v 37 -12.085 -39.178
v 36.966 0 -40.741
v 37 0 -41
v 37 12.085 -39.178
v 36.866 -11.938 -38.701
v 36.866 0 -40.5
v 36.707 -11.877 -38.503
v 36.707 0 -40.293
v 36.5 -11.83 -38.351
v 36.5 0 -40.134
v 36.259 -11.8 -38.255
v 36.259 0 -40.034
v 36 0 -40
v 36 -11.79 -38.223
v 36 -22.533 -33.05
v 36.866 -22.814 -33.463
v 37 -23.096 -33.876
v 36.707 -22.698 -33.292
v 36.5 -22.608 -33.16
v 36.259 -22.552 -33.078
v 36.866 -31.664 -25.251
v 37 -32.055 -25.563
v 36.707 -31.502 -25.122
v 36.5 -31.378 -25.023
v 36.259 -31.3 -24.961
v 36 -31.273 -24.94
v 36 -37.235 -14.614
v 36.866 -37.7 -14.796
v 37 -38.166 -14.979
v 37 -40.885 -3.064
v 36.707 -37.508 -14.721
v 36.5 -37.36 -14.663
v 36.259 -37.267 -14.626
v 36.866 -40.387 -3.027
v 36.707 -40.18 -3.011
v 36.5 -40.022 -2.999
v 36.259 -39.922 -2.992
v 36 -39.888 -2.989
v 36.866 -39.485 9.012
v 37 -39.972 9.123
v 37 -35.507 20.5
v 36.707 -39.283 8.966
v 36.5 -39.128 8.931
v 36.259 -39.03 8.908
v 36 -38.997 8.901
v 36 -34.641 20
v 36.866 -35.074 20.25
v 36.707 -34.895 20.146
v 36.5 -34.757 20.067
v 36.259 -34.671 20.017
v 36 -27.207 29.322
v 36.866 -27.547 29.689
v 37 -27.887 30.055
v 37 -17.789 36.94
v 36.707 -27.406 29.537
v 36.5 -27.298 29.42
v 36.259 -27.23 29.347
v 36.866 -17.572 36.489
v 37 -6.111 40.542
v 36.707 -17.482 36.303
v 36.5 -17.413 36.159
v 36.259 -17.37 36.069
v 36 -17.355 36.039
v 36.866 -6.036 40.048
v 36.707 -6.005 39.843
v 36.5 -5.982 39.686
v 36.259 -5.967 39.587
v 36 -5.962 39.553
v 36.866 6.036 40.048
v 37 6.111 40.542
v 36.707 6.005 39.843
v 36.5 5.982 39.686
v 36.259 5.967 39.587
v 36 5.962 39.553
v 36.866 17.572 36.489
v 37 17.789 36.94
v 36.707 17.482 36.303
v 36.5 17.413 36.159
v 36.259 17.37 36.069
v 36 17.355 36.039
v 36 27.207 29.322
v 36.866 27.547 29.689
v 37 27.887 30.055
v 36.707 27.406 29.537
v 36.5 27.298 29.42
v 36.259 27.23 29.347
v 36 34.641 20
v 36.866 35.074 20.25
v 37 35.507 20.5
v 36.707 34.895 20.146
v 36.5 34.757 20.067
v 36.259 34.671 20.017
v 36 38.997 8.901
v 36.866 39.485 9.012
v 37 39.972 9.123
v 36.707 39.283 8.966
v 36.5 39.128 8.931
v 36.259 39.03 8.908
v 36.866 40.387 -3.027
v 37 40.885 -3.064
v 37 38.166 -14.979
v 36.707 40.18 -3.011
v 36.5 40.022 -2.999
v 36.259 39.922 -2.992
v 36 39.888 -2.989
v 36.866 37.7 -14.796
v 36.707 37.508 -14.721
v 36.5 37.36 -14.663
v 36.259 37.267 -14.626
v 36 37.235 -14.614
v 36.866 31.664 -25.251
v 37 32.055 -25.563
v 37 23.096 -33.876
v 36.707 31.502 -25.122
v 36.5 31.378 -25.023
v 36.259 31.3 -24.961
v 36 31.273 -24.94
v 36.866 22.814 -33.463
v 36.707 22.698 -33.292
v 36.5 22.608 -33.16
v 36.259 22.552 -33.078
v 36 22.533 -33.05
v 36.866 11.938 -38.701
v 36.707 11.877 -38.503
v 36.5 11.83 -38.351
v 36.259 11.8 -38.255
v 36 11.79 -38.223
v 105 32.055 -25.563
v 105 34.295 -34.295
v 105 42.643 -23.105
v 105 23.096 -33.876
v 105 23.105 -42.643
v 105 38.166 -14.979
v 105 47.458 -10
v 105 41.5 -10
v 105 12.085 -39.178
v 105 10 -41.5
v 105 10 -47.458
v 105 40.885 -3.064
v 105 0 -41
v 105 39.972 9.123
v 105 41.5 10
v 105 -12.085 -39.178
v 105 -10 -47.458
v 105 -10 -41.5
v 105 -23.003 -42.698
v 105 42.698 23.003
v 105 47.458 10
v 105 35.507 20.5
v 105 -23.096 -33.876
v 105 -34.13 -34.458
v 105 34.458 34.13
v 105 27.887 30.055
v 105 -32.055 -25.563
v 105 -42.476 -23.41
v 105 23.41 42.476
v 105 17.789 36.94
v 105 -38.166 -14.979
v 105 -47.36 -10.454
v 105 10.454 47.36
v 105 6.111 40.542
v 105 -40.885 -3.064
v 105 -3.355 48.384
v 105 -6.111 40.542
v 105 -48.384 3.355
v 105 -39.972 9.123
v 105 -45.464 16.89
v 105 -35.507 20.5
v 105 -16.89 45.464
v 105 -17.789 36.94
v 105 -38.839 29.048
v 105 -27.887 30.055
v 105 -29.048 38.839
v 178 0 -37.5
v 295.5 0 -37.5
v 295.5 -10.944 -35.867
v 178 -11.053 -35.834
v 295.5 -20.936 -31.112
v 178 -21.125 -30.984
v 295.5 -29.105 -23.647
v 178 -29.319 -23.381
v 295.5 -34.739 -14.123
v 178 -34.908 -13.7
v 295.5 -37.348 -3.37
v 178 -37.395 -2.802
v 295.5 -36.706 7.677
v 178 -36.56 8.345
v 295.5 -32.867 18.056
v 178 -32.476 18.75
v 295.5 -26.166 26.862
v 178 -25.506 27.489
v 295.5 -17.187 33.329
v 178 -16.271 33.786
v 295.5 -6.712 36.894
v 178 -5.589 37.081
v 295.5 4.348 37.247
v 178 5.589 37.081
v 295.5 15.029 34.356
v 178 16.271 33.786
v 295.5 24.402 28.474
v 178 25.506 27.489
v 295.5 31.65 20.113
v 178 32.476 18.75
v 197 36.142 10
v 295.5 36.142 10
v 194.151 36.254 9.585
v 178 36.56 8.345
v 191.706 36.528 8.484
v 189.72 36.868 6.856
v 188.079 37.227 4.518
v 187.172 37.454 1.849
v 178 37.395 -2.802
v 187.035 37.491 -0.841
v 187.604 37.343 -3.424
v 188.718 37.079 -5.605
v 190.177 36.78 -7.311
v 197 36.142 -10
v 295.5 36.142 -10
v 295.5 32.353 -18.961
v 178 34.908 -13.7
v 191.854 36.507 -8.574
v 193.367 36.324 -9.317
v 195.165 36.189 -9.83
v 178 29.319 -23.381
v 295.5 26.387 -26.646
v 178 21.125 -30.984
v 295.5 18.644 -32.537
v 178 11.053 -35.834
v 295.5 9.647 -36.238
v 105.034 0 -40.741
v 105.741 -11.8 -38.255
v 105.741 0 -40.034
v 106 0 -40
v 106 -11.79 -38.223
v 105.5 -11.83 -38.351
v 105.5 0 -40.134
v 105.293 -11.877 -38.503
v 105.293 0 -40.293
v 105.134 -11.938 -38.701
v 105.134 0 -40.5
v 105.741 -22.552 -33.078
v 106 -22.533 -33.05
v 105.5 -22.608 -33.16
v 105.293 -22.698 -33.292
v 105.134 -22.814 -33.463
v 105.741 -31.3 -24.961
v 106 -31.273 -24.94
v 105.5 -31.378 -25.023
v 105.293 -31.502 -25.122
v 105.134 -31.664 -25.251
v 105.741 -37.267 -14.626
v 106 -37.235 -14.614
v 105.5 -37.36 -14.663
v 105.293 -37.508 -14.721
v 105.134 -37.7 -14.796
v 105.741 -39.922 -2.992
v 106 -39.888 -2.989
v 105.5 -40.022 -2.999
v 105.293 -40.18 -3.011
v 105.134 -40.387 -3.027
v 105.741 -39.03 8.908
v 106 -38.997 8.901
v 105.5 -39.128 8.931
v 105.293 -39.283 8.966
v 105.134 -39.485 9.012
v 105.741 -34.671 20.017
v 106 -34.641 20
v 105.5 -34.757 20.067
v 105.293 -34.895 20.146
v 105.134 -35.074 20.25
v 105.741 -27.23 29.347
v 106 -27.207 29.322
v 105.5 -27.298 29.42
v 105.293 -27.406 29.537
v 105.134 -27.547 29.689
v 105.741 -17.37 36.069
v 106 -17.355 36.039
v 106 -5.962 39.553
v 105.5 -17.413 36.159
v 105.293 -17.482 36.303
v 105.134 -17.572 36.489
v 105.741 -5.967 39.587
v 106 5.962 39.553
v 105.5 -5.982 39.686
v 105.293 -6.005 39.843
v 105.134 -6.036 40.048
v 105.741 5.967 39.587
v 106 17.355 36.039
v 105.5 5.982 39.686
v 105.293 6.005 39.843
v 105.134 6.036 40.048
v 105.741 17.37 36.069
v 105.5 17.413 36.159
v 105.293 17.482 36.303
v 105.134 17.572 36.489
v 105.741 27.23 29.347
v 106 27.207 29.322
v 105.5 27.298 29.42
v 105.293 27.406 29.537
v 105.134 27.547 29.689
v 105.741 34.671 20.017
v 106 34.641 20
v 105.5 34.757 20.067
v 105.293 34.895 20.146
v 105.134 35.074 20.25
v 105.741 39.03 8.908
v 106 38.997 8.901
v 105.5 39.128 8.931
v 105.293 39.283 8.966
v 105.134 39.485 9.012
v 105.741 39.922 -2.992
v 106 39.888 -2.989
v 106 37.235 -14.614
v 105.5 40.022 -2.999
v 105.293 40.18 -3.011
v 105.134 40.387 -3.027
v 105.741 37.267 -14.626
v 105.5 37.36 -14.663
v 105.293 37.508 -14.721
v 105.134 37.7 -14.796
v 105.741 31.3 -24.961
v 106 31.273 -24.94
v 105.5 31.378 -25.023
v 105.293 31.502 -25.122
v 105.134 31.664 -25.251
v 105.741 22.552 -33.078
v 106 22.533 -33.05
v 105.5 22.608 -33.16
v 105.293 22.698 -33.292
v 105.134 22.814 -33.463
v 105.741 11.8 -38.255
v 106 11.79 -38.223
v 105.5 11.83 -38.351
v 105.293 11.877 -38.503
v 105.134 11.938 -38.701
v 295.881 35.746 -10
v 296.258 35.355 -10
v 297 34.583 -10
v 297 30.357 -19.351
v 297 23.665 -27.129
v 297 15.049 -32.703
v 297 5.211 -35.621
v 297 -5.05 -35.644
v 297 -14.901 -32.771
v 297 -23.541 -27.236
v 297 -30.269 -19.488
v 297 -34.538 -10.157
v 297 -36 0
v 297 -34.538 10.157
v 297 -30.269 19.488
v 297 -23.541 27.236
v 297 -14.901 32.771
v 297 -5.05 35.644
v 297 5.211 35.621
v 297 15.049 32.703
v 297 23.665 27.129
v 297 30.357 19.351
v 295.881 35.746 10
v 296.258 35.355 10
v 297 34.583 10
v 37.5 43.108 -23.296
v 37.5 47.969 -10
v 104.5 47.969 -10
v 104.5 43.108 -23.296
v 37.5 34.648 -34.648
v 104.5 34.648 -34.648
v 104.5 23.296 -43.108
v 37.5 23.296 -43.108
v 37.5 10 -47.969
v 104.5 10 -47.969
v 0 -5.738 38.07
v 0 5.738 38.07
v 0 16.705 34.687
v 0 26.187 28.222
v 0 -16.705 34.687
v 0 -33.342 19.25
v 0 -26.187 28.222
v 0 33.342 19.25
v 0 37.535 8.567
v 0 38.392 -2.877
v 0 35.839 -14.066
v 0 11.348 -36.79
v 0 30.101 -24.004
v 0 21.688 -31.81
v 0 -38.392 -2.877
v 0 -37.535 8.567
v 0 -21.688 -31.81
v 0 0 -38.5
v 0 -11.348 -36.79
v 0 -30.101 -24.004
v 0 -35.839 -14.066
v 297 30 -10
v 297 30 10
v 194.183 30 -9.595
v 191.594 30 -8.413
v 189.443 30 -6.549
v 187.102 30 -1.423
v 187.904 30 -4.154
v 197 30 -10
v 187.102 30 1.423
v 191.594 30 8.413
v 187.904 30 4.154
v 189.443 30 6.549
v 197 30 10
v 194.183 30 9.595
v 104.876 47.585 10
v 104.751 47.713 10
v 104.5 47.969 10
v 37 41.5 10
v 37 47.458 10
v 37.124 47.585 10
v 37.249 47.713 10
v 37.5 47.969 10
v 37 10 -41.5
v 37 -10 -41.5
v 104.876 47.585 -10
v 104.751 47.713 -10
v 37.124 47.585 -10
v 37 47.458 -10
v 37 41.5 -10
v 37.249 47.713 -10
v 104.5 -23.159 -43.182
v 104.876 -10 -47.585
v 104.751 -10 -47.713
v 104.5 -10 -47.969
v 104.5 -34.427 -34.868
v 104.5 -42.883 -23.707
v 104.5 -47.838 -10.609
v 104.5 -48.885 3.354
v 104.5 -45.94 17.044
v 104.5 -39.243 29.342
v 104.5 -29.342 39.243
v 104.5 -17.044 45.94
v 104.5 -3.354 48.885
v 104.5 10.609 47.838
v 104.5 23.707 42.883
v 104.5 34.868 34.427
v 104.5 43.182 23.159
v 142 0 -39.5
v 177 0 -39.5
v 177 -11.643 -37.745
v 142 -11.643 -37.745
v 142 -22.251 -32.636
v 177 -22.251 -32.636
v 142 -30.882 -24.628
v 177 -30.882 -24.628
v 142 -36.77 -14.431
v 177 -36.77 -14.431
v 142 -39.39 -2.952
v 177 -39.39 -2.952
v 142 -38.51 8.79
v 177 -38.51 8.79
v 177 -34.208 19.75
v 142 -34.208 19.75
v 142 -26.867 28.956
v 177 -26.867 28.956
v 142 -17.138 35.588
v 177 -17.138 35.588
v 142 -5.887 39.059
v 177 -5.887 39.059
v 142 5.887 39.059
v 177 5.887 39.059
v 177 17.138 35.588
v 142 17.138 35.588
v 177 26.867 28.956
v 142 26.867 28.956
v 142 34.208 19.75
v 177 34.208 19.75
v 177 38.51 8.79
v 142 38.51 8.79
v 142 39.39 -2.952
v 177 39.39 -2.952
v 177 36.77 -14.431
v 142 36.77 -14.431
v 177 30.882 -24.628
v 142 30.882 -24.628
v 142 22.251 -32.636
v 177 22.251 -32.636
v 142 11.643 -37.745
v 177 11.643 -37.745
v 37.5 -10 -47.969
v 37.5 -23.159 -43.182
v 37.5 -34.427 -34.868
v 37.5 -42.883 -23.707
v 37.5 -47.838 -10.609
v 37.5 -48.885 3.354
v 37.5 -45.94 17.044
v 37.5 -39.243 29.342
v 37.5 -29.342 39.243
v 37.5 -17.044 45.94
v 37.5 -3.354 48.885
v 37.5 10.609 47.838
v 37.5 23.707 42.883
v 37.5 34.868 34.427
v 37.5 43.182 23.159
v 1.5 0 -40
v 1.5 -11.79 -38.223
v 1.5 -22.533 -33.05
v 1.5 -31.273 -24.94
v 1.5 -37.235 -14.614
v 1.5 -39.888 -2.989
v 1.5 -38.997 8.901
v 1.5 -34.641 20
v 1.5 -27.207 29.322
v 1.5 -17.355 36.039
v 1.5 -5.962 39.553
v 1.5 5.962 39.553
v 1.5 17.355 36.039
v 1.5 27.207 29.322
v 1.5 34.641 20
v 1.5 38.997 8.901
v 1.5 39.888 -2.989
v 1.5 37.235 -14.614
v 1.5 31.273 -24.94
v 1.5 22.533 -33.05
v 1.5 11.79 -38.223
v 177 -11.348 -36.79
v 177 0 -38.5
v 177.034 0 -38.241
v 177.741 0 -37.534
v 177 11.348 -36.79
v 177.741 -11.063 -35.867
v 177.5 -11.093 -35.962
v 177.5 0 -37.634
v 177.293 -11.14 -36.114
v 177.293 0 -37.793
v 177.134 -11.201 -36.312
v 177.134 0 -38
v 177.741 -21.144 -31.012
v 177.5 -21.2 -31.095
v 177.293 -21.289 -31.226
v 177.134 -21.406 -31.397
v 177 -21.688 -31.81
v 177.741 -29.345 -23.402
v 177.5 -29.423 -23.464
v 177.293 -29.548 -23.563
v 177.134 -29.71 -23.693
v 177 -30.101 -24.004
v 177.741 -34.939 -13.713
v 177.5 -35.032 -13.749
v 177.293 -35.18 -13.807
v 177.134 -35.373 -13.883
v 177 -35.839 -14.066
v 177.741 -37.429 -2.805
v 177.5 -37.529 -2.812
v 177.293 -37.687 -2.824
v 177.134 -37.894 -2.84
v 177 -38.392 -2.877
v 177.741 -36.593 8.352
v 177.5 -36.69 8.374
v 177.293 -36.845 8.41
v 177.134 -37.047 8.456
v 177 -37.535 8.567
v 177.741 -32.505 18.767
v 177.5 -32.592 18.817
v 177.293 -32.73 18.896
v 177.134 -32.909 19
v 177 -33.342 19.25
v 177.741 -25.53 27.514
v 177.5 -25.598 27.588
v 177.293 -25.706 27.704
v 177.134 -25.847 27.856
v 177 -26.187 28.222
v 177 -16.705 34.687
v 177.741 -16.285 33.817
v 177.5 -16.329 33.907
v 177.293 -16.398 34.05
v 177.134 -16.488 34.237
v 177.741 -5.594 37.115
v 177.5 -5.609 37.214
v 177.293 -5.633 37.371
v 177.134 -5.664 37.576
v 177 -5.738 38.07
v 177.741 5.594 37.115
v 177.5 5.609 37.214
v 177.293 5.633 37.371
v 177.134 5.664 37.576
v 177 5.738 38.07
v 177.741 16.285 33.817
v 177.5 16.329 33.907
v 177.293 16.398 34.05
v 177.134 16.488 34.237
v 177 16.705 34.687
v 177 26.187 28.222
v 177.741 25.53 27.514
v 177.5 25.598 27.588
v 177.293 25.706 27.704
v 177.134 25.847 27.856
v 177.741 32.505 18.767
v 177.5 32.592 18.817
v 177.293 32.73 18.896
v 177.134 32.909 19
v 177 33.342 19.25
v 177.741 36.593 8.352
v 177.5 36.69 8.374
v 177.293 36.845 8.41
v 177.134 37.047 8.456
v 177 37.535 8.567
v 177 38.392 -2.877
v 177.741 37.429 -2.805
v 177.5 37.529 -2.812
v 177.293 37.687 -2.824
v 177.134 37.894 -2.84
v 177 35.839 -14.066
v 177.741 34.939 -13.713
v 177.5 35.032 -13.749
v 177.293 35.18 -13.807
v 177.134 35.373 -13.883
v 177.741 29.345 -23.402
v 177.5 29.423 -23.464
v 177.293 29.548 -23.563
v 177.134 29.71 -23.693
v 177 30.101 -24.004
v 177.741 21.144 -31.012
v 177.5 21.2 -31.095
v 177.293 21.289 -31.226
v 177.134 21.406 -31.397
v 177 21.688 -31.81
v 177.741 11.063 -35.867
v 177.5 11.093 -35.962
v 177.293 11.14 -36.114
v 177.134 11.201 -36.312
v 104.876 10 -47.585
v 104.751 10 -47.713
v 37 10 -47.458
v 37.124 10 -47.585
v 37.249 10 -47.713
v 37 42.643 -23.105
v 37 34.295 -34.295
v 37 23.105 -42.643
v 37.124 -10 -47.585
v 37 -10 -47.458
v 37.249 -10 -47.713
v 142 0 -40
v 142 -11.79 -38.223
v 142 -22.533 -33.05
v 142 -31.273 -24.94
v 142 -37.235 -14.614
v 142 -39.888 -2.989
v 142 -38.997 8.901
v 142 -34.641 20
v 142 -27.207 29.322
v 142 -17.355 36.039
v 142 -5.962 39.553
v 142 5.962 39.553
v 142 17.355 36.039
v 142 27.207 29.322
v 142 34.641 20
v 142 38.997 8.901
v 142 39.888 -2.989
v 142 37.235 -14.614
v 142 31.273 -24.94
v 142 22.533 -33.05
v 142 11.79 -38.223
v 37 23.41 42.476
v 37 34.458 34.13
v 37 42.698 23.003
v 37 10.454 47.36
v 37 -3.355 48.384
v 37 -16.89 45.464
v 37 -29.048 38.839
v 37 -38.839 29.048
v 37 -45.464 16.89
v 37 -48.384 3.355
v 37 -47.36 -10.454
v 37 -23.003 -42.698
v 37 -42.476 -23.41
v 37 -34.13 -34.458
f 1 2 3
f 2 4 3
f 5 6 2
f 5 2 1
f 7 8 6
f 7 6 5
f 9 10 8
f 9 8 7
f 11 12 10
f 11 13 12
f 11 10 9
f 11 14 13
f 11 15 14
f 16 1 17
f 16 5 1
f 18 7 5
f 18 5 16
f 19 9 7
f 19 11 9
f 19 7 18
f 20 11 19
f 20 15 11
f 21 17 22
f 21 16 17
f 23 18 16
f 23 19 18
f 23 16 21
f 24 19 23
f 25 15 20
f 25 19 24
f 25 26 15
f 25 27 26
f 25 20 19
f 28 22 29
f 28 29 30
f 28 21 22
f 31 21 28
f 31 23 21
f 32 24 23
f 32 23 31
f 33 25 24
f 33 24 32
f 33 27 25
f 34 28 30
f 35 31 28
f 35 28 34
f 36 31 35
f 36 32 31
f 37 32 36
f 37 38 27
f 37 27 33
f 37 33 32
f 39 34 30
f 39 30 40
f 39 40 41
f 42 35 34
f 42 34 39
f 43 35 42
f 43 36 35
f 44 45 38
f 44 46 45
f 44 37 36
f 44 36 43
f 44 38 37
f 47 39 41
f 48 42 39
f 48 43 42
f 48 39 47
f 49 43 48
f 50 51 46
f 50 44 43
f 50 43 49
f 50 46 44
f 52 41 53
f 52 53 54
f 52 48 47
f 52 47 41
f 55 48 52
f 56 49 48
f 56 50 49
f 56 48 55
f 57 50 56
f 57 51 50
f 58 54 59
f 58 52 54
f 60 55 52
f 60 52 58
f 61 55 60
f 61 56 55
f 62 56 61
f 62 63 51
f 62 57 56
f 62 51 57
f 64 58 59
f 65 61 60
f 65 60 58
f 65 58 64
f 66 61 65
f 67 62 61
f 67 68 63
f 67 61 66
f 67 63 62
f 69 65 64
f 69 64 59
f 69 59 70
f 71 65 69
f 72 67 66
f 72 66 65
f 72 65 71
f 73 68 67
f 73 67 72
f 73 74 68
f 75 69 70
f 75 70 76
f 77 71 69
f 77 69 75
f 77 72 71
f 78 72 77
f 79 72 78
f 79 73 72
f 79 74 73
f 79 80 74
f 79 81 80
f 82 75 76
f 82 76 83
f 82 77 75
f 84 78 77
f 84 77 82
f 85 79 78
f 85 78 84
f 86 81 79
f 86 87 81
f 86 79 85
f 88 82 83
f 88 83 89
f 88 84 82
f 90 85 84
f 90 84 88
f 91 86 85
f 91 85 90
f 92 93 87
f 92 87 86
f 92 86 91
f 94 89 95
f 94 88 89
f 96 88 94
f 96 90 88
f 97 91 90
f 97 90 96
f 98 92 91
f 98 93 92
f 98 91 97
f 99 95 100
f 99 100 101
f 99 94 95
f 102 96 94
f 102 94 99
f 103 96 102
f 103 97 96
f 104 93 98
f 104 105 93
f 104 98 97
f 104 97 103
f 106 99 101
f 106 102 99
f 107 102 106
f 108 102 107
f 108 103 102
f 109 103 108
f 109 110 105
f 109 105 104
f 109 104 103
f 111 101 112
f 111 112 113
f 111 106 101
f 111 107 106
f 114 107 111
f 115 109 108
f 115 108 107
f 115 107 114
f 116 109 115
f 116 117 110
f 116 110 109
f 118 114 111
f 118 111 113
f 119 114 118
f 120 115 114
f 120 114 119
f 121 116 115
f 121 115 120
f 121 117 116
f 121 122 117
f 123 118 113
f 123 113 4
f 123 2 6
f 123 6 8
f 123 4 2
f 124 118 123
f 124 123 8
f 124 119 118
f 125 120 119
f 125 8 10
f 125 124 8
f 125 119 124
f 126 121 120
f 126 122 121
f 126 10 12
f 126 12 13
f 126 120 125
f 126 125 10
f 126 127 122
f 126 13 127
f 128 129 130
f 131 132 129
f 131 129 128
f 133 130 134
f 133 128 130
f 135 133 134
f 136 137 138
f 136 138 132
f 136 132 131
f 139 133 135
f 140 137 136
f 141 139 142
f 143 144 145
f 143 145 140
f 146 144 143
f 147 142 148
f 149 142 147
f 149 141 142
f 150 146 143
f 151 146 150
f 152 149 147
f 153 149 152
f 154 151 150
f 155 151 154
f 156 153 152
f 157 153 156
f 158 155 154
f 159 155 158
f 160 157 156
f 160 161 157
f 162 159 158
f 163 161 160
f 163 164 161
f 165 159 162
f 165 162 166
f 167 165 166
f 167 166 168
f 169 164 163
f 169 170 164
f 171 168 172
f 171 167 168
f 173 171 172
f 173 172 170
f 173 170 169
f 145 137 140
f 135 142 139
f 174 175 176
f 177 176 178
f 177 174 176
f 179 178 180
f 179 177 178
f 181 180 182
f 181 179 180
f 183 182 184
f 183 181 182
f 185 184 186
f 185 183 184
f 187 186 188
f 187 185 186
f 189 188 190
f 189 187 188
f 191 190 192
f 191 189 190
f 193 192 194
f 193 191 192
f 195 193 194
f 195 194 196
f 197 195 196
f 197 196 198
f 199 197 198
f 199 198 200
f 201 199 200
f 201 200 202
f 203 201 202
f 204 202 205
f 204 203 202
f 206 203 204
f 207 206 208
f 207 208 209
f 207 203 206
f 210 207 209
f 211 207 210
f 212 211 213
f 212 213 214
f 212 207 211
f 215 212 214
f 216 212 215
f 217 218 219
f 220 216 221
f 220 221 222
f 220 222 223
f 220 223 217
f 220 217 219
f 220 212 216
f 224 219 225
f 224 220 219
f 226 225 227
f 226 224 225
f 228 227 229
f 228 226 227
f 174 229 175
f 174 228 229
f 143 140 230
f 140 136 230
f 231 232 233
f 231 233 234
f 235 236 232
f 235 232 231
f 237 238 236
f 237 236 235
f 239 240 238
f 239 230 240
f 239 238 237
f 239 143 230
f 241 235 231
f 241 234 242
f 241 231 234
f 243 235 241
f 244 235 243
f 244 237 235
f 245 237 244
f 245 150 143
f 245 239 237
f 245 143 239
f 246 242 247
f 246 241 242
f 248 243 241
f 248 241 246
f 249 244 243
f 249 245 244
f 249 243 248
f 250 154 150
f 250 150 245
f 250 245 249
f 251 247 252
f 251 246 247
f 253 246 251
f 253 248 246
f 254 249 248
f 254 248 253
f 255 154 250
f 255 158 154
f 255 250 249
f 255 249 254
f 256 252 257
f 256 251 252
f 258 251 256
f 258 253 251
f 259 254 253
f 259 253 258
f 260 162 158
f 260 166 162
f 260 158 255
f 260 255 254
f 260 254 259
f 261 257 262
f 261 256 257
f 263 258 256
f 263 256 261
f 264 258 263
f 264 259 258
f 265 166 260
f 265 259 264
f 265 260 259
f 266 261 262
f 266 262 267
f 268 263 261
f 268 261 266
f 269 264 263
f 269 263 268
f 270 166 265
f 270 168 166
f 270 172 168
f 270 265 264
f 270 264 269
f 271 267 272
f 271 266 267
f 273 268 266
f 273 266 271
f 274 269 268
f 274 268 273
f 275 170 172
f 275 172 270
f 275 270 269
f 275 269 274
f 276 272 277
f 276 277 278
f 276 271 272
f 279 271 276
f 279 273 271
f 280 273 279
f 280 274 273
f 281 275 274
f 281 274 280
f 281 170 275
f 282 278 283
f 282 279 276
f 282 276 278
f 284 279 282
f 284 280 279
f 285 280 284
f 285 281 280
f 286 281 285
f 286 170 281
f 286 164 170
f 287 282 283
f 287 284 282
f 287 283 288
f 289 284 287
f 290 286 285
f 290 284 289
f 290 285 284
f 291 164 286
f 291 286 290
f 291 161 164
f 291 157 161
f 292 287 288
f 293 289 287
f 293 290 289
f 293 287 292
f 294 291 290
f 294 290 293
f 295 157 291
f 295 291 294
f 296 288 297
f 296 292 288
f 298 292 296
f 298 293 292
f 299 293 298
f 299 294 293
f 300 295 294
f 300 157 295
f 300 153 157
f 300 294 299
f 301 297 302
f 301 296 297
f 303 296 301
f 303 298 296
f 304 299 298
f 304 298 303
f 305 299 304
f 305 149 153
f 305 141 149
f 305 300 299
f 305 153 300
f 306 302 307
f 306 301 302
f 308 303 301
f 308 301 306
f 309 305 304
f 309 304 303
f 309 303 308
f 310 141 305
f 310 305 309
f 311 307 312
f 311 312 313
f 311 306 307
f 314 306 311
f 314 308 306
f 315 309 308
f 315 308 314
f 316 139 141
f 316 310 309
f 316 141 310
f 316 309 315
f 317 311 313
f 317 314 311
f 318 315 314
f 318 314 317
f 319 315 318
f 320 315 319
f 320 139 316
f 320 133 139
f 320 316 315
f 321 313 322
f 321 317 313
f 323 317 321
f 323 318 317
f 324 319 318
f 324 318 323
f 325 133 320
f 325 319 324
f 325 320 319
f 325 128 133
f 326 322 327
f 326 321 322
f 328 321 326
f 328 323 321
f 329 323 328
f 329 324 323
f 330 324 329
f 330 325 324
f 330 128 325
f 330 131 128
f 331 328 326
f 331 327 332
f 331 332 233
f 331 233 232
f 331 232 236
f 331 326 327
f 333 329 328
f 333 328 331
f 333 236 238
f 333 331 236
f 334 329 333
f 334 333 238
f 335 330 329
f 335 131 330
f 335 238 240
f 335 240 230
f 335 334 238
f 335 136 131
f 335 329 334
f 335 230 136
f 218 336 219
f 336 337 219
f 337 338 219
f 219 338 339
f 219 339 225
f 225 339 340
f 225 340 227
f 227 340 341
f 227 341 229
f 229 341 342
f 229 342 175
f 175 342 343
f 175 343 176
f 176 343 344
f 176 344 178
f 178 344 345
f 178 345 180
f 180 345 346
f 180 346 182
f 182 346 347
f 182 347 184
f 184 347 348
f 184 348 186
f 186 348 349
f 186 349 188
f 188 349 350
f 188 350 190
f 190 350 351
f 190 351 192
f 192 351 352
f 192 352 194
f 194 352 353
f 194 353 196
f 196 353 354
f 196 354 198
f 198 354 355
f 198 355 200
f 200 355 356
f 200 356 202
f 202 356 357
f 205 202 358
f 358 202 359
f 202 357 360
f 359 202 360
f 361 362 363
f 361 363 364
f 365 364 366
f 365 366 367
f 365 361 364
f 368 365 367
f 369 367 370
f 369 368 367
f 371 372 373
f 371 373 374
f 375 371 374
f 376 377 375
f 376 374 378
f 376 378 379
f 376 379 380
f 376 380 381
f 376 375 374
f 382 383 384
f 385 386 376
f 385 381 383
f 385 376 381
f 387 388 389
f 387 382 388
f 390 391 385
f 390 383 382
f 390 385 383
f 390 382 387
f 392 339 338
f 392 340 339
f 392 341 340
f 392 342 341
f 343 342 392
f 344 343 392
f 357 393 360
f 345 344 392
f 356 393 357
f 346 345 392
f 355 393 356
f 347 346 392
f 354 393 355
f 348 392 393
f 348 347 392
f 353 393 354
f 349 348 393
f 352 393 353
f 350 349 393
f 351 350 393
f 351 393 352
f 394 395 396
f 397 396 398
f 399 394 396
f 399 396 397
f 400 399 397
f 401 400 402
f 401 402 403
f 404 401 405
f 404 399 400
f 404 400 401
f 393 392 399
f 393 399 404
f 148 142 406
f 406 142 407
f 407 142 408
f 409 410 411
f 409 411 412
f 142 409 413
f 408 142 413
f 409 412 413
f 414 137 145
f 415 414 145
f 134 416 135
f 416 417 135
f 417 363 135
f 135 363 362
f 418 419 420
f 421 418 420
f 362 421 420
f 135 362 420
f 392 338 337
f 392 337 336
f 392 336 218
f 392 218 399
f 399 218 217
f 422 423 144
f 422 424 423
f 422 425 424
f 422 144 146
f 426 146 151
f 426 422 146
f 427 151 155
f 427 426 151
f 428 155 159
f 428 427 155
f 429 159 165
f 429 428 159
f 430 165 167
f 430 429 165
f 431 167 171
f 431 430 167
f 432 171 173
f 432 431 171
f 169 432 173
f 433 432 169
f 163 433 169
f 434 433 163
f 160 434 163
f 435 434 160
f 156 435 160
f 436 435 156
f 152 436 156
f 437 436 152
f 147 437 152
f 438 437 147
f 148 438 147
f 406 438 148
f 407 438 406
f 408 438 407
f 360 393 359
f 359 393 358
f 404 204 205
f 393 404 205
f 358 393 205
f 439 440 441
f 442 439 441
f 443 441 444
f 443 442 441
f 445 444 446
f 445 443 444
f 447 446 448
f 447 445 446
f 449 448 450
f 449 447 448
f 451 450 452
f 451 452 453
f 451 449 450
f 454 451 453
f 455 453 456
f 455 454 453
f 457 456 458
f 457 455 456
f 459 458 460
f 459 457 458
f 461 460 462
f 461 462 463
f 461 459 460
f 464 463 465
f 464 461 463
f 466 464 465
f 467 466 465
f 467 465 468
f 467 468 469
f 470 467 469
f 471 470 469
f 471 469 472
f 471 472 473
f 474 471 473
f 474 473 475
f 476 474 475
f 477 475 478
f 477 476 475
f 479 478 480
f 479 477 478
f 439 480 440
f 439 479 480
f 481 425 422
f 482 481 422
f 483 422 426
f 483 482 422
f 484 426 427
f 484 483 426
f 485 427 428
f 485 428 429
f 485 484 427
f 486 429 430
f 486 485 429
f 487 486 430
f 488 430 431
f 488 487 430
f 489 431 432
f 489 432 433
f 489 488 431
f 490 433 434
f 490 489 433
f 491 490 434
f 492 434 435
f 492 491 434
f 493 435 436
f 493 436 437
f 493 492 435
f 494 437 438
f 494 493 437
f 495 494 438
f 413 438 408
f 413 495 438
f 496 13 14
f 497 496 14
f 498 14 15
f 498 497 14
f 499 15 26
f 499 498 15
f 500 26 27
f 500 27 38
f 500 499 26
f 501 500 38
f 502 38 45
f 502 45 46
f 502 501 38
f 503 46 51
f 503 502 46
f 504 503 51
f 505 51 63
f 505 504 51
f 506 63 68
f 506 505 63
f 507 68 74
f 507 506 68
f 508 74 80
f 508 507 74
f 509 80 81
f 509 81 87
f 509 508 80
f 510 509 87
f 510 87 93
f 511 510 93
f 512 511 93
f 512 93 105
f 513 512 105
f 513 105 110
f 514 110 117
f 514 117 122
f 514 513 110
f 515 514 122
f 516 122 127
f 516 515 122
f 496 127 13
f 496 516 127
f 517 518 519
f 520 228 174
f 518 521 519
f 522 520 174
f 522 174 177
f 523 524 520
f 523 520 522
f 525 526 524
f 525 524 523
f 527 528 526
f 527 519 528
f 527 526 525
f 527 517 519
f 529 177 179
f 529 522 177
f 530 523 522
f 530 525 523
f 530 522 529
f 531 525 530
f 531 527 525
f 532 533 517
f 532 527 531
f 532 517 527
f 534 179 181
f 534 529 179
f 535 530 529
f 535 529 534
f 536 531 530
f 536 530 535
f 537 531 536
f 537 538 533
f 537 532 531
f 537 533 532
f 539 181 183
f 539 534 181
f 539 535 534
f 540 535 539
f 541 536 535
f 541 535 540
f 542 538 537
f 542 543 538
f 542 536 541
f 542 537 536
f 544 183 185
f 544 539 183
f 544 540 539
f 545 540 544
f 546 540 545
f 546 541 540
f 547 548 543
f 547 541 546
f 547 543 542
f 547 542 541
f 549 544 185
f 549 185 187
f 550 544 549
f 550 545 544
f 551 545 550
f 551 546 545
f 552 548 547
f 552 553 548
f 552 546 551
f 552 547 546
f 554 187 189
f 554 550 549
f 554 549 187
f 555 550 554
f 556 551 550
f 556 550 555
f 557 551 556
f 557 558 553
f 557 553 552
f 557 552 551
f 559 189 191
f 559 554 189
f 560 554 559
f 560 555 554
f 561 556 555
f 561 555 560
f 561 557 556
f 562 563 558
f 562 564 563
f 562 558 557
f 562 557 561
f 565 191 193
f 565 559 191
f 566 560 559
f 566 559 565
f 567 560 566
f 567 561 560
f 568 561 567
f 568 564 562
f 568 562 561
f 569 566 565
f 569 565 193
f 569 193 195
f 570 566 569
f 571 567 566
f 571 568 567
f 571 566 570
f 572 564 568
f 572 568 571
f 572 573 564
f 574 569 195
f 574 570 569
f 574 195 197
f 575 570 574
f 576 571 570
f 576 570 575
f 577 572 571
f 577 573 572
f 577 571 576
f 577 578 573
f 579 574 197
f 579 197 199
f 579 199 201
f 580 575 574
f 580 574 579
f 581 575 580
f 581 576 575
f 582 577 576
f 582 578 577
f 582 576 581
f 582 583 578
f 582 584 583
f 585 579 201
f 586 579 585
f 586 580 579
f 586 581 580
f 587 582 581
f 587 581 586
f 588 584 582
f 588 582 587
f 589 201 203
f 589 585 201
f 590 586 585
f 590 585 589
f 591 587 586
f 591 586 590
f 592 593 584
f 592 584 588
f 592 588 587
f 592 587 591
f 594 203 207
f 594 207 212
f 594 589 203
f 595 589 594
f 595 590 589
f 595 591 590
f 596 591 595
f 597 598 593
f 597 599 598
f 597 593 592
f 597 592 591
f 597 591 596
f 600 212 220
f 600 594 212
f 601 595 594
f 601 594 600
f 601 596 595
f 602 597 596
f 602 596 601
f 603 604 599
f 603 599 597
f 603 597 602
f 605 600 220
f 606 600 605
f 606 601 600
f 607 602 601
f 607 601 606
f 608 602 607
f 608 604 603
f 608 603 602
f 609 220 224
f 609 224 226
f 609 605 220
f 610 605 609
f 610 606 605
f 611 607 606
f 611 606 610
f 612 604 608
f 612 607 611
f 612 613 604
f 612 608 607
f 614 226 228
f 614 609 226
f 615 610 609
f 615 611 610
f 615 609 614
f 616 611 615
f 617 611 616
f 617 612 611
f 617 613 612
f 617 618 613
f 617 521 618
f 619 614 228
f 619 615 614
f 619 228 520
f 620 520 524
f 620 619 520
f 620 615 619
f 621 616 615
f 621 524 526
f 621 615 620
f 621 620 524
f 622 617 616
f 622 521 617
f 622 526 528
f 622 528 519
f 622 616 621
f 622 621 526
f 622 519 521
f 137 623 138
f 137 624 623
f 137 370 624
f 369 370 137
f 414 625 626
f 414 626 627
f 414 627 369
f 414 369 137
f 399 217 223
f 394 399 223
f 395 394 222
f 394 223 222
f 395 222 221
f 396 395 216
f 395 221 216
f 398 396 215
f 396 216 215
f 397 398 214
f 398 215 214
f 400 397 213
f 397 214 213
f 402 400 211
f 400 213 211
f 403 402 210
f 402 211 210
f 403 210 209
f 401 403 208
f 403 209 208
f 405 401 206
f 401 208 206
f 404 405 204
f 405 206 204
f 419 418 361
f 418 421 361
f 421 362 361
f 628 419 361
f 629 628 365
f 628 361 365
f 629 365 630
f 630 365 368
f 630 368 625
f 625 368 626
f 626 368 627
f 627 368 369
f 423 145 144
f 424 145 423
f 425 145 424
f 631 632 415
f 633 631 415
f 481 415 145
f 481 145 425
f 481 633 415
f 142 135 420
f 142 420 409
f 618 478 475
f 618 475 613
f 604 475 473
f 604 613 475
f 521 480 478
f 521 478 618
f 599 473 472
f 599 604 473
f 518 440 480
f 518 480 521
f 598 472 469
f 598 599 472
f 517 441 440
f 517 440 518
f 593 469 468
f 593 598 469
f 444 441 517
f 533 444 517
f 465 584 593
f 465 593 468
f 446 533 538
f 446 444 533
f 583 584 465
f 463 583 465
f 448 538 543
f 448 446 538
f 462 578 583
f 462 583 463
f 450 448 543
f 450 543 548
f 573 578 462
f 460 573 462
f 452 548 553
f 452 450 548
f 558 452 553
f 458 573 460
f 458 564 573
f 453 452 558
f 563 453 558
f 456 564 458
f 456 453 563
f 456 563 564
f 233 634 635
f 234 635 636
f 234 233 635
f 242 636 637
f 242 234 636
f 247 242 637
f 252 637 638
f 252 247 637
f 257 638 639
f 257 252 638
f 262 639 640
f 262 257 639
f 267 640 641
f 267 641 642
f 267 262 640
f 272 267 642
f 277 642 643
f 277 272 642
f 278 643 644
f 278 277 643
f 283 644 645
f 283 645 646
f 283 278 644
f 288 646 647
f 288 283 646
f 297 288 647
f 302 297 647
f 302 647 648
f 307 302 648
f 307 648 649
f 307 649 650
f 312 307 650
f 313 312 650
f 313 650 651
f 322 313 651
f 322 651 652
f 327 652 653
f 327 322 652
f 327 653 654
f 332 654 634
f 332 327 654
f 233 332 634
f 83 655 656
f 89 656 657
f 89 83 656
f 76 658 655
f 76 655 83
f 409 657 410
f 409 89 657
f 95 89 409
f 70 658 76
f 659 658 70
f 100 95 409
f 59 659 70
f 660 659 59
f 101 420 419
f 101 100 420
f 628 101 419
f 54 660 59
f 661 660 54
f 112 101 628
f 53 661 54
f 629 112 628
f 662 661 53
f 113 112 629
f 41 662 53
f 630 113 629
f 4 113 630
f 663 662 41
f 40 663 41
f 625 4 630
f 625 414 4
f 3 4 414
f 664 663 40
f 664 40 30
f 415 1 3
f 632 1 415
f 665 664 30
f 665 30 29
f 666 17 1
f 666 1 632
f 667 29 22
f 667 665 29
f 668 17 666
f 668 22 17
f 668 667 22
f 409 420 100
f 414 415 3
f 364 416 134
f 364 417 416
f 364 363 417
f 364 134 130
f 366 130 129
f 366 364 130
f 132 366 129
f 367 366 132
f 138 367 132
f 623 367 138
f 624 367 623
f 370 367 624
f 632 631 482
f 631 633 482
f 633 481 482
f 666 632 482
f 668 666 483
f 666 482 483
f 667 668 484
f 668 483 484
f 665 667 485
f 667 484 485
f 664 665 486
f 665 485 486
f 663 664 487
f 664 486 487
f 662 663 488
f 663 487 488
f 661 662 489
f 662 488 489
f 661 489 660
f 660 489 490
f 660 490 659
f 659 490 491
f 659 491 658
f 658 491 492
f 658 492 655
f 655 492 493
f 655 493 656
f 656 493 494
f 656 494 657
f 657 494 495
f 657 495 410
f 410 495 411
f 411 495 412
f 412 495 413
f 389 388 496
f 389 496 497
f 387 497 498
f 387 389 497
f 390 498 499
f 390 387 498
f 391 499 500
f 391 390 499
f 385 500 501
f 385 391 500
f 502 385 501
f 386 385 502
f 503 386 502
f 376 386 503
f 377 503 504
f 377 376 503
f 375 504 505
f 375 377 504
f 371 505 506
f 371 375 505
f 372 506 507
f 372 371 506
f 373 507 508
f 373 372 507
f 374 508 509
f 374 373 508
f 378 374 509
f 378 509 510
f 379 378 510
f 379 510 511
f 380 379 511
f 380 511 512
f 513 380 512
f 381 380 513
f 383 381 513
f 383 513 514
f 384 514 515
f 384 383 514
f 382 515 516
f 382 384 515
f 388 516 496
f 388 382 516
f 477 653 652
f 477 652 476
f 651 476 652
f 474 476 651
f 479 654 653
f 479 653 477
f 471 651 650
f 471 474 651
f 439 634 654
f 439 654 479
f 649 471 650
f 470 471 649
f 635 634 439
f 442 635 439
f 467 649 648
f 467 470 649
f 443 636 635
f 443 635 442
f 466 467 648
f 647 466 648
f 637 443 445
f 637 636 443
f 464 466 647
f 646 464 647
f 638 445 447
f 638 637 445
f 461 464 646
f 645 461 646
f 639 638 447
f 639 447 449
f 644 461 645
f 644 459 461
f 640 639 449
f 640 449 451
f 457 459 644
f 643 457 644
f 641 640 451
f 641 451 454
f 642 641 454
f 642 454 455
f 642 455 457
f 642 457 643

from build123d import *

# Parameters (mm, degrees)
EXTRUDE1_DEPTH = 68
FILLET1_R      = 1
EXTRUDE2_DEPTH = 7.5
CHAMFER1_SIZE  = 1.5
CHAMFER2_SIZE  = 0.5


with BuildPart() as part:
    # Sketch1 → Revolve1 (revolve)
    with BuildSketch(Plane.XY, mode=Mode.PRIVATE) as revolve1_sk:
        Polygon((0, 0), (297, 0), (297, 37.5), (177, 37.5), (177, 39.5), (142, 39.5), (142, 40), (105, 40), (105, 49), (37, 49), (37, 40), (0, 40), align=None)
    revolve(revolve1_sk.sketch.rotate(Axis((0, 0, 0), (-1, 0, 0)), 90), axis=Axis((0, 0, 0), (-1, 0, 0)))

    # Sketch2 → Extrude1 (cut)
    with BuildSketch(Plane.ZY.offset(-37)):
        with BuildLine():
            Line((-10, 47.968739821), (-10, 41.5))
            Line((-10, 41.5), (10, 41.5))
            Line((10, 41.5), (10, 47.968739821))
            ThreePointArc((10, 47.968739821), (0, 49), (-10, 47.968739821))
        make_face()
        with BuildLine():
            Line((-47.968739821, 10), (-41.5, 10))
            Line((-41.5, 10), (-41.5, -10))
            Line((-41.5, -10), (-47.968739821, -10))
            ThreePointArc((-47.968739821, -10), (-49, 0), (-47.968739821, 10))
        make_face()
    extrude(amount=-EXTRUDE1_DEPTH, mode=Mode.SUBTRACT)

    # Fillet1
    fillet1_edges = [part.edges().sort_by_distance(p)[0] for p in [
        (177, 0, 37.5),
        (105, 0, 40),
        (37, 0, 40),
    ]]
    fillet(fillet1_edges, radius=FILLET1_R)

    # Sketch3 → Extrude2 (cut)
    with BuildSketch(Plane(origin=(237.5, 37.5, 0), x_dir=(0, 0, 1), z_dir=(0, 1, 0))):
        with BuildLine():
            Line((-10, 59.5), (-10, -40.5))
            ThreePointArc((-10, -40.5), (0, -50.5), (10, -40.5))
            Line((10, -40.5), (10, 59.5))
            ThreePointArc((10, 59.5), (0, 69.5), (-10, 59.5))
        make_face()
    extrude(amount=-EXTRUDE2_DEPTH, mode=Mode.SUBTRACT)

    # Chamfer1
    chamfer1_edges = [part.edges().sort_by_distance(p)[0] for p in [
        (0, 0, 40),
        (297, -29.843340966, 22.707377656),
    ]]
    chamfer(chamfer1_edges, length=CHAMFER1_SIZE)

    # Chamfer2
    chamfer2_edges = [part.edges().sort_by_distance(p)[0] for p in [
        (105, -34.648232278, 34.648232278),
        (37, -34.648232278, 34.648232278),
        (105, 34.648232278, -34.648232278),
        (37, 34.648232278, -34.648232278),
    ]]
    chamfer(chamfer2_edges, length=CHAMFER2_SIZE)


solid = part.part
